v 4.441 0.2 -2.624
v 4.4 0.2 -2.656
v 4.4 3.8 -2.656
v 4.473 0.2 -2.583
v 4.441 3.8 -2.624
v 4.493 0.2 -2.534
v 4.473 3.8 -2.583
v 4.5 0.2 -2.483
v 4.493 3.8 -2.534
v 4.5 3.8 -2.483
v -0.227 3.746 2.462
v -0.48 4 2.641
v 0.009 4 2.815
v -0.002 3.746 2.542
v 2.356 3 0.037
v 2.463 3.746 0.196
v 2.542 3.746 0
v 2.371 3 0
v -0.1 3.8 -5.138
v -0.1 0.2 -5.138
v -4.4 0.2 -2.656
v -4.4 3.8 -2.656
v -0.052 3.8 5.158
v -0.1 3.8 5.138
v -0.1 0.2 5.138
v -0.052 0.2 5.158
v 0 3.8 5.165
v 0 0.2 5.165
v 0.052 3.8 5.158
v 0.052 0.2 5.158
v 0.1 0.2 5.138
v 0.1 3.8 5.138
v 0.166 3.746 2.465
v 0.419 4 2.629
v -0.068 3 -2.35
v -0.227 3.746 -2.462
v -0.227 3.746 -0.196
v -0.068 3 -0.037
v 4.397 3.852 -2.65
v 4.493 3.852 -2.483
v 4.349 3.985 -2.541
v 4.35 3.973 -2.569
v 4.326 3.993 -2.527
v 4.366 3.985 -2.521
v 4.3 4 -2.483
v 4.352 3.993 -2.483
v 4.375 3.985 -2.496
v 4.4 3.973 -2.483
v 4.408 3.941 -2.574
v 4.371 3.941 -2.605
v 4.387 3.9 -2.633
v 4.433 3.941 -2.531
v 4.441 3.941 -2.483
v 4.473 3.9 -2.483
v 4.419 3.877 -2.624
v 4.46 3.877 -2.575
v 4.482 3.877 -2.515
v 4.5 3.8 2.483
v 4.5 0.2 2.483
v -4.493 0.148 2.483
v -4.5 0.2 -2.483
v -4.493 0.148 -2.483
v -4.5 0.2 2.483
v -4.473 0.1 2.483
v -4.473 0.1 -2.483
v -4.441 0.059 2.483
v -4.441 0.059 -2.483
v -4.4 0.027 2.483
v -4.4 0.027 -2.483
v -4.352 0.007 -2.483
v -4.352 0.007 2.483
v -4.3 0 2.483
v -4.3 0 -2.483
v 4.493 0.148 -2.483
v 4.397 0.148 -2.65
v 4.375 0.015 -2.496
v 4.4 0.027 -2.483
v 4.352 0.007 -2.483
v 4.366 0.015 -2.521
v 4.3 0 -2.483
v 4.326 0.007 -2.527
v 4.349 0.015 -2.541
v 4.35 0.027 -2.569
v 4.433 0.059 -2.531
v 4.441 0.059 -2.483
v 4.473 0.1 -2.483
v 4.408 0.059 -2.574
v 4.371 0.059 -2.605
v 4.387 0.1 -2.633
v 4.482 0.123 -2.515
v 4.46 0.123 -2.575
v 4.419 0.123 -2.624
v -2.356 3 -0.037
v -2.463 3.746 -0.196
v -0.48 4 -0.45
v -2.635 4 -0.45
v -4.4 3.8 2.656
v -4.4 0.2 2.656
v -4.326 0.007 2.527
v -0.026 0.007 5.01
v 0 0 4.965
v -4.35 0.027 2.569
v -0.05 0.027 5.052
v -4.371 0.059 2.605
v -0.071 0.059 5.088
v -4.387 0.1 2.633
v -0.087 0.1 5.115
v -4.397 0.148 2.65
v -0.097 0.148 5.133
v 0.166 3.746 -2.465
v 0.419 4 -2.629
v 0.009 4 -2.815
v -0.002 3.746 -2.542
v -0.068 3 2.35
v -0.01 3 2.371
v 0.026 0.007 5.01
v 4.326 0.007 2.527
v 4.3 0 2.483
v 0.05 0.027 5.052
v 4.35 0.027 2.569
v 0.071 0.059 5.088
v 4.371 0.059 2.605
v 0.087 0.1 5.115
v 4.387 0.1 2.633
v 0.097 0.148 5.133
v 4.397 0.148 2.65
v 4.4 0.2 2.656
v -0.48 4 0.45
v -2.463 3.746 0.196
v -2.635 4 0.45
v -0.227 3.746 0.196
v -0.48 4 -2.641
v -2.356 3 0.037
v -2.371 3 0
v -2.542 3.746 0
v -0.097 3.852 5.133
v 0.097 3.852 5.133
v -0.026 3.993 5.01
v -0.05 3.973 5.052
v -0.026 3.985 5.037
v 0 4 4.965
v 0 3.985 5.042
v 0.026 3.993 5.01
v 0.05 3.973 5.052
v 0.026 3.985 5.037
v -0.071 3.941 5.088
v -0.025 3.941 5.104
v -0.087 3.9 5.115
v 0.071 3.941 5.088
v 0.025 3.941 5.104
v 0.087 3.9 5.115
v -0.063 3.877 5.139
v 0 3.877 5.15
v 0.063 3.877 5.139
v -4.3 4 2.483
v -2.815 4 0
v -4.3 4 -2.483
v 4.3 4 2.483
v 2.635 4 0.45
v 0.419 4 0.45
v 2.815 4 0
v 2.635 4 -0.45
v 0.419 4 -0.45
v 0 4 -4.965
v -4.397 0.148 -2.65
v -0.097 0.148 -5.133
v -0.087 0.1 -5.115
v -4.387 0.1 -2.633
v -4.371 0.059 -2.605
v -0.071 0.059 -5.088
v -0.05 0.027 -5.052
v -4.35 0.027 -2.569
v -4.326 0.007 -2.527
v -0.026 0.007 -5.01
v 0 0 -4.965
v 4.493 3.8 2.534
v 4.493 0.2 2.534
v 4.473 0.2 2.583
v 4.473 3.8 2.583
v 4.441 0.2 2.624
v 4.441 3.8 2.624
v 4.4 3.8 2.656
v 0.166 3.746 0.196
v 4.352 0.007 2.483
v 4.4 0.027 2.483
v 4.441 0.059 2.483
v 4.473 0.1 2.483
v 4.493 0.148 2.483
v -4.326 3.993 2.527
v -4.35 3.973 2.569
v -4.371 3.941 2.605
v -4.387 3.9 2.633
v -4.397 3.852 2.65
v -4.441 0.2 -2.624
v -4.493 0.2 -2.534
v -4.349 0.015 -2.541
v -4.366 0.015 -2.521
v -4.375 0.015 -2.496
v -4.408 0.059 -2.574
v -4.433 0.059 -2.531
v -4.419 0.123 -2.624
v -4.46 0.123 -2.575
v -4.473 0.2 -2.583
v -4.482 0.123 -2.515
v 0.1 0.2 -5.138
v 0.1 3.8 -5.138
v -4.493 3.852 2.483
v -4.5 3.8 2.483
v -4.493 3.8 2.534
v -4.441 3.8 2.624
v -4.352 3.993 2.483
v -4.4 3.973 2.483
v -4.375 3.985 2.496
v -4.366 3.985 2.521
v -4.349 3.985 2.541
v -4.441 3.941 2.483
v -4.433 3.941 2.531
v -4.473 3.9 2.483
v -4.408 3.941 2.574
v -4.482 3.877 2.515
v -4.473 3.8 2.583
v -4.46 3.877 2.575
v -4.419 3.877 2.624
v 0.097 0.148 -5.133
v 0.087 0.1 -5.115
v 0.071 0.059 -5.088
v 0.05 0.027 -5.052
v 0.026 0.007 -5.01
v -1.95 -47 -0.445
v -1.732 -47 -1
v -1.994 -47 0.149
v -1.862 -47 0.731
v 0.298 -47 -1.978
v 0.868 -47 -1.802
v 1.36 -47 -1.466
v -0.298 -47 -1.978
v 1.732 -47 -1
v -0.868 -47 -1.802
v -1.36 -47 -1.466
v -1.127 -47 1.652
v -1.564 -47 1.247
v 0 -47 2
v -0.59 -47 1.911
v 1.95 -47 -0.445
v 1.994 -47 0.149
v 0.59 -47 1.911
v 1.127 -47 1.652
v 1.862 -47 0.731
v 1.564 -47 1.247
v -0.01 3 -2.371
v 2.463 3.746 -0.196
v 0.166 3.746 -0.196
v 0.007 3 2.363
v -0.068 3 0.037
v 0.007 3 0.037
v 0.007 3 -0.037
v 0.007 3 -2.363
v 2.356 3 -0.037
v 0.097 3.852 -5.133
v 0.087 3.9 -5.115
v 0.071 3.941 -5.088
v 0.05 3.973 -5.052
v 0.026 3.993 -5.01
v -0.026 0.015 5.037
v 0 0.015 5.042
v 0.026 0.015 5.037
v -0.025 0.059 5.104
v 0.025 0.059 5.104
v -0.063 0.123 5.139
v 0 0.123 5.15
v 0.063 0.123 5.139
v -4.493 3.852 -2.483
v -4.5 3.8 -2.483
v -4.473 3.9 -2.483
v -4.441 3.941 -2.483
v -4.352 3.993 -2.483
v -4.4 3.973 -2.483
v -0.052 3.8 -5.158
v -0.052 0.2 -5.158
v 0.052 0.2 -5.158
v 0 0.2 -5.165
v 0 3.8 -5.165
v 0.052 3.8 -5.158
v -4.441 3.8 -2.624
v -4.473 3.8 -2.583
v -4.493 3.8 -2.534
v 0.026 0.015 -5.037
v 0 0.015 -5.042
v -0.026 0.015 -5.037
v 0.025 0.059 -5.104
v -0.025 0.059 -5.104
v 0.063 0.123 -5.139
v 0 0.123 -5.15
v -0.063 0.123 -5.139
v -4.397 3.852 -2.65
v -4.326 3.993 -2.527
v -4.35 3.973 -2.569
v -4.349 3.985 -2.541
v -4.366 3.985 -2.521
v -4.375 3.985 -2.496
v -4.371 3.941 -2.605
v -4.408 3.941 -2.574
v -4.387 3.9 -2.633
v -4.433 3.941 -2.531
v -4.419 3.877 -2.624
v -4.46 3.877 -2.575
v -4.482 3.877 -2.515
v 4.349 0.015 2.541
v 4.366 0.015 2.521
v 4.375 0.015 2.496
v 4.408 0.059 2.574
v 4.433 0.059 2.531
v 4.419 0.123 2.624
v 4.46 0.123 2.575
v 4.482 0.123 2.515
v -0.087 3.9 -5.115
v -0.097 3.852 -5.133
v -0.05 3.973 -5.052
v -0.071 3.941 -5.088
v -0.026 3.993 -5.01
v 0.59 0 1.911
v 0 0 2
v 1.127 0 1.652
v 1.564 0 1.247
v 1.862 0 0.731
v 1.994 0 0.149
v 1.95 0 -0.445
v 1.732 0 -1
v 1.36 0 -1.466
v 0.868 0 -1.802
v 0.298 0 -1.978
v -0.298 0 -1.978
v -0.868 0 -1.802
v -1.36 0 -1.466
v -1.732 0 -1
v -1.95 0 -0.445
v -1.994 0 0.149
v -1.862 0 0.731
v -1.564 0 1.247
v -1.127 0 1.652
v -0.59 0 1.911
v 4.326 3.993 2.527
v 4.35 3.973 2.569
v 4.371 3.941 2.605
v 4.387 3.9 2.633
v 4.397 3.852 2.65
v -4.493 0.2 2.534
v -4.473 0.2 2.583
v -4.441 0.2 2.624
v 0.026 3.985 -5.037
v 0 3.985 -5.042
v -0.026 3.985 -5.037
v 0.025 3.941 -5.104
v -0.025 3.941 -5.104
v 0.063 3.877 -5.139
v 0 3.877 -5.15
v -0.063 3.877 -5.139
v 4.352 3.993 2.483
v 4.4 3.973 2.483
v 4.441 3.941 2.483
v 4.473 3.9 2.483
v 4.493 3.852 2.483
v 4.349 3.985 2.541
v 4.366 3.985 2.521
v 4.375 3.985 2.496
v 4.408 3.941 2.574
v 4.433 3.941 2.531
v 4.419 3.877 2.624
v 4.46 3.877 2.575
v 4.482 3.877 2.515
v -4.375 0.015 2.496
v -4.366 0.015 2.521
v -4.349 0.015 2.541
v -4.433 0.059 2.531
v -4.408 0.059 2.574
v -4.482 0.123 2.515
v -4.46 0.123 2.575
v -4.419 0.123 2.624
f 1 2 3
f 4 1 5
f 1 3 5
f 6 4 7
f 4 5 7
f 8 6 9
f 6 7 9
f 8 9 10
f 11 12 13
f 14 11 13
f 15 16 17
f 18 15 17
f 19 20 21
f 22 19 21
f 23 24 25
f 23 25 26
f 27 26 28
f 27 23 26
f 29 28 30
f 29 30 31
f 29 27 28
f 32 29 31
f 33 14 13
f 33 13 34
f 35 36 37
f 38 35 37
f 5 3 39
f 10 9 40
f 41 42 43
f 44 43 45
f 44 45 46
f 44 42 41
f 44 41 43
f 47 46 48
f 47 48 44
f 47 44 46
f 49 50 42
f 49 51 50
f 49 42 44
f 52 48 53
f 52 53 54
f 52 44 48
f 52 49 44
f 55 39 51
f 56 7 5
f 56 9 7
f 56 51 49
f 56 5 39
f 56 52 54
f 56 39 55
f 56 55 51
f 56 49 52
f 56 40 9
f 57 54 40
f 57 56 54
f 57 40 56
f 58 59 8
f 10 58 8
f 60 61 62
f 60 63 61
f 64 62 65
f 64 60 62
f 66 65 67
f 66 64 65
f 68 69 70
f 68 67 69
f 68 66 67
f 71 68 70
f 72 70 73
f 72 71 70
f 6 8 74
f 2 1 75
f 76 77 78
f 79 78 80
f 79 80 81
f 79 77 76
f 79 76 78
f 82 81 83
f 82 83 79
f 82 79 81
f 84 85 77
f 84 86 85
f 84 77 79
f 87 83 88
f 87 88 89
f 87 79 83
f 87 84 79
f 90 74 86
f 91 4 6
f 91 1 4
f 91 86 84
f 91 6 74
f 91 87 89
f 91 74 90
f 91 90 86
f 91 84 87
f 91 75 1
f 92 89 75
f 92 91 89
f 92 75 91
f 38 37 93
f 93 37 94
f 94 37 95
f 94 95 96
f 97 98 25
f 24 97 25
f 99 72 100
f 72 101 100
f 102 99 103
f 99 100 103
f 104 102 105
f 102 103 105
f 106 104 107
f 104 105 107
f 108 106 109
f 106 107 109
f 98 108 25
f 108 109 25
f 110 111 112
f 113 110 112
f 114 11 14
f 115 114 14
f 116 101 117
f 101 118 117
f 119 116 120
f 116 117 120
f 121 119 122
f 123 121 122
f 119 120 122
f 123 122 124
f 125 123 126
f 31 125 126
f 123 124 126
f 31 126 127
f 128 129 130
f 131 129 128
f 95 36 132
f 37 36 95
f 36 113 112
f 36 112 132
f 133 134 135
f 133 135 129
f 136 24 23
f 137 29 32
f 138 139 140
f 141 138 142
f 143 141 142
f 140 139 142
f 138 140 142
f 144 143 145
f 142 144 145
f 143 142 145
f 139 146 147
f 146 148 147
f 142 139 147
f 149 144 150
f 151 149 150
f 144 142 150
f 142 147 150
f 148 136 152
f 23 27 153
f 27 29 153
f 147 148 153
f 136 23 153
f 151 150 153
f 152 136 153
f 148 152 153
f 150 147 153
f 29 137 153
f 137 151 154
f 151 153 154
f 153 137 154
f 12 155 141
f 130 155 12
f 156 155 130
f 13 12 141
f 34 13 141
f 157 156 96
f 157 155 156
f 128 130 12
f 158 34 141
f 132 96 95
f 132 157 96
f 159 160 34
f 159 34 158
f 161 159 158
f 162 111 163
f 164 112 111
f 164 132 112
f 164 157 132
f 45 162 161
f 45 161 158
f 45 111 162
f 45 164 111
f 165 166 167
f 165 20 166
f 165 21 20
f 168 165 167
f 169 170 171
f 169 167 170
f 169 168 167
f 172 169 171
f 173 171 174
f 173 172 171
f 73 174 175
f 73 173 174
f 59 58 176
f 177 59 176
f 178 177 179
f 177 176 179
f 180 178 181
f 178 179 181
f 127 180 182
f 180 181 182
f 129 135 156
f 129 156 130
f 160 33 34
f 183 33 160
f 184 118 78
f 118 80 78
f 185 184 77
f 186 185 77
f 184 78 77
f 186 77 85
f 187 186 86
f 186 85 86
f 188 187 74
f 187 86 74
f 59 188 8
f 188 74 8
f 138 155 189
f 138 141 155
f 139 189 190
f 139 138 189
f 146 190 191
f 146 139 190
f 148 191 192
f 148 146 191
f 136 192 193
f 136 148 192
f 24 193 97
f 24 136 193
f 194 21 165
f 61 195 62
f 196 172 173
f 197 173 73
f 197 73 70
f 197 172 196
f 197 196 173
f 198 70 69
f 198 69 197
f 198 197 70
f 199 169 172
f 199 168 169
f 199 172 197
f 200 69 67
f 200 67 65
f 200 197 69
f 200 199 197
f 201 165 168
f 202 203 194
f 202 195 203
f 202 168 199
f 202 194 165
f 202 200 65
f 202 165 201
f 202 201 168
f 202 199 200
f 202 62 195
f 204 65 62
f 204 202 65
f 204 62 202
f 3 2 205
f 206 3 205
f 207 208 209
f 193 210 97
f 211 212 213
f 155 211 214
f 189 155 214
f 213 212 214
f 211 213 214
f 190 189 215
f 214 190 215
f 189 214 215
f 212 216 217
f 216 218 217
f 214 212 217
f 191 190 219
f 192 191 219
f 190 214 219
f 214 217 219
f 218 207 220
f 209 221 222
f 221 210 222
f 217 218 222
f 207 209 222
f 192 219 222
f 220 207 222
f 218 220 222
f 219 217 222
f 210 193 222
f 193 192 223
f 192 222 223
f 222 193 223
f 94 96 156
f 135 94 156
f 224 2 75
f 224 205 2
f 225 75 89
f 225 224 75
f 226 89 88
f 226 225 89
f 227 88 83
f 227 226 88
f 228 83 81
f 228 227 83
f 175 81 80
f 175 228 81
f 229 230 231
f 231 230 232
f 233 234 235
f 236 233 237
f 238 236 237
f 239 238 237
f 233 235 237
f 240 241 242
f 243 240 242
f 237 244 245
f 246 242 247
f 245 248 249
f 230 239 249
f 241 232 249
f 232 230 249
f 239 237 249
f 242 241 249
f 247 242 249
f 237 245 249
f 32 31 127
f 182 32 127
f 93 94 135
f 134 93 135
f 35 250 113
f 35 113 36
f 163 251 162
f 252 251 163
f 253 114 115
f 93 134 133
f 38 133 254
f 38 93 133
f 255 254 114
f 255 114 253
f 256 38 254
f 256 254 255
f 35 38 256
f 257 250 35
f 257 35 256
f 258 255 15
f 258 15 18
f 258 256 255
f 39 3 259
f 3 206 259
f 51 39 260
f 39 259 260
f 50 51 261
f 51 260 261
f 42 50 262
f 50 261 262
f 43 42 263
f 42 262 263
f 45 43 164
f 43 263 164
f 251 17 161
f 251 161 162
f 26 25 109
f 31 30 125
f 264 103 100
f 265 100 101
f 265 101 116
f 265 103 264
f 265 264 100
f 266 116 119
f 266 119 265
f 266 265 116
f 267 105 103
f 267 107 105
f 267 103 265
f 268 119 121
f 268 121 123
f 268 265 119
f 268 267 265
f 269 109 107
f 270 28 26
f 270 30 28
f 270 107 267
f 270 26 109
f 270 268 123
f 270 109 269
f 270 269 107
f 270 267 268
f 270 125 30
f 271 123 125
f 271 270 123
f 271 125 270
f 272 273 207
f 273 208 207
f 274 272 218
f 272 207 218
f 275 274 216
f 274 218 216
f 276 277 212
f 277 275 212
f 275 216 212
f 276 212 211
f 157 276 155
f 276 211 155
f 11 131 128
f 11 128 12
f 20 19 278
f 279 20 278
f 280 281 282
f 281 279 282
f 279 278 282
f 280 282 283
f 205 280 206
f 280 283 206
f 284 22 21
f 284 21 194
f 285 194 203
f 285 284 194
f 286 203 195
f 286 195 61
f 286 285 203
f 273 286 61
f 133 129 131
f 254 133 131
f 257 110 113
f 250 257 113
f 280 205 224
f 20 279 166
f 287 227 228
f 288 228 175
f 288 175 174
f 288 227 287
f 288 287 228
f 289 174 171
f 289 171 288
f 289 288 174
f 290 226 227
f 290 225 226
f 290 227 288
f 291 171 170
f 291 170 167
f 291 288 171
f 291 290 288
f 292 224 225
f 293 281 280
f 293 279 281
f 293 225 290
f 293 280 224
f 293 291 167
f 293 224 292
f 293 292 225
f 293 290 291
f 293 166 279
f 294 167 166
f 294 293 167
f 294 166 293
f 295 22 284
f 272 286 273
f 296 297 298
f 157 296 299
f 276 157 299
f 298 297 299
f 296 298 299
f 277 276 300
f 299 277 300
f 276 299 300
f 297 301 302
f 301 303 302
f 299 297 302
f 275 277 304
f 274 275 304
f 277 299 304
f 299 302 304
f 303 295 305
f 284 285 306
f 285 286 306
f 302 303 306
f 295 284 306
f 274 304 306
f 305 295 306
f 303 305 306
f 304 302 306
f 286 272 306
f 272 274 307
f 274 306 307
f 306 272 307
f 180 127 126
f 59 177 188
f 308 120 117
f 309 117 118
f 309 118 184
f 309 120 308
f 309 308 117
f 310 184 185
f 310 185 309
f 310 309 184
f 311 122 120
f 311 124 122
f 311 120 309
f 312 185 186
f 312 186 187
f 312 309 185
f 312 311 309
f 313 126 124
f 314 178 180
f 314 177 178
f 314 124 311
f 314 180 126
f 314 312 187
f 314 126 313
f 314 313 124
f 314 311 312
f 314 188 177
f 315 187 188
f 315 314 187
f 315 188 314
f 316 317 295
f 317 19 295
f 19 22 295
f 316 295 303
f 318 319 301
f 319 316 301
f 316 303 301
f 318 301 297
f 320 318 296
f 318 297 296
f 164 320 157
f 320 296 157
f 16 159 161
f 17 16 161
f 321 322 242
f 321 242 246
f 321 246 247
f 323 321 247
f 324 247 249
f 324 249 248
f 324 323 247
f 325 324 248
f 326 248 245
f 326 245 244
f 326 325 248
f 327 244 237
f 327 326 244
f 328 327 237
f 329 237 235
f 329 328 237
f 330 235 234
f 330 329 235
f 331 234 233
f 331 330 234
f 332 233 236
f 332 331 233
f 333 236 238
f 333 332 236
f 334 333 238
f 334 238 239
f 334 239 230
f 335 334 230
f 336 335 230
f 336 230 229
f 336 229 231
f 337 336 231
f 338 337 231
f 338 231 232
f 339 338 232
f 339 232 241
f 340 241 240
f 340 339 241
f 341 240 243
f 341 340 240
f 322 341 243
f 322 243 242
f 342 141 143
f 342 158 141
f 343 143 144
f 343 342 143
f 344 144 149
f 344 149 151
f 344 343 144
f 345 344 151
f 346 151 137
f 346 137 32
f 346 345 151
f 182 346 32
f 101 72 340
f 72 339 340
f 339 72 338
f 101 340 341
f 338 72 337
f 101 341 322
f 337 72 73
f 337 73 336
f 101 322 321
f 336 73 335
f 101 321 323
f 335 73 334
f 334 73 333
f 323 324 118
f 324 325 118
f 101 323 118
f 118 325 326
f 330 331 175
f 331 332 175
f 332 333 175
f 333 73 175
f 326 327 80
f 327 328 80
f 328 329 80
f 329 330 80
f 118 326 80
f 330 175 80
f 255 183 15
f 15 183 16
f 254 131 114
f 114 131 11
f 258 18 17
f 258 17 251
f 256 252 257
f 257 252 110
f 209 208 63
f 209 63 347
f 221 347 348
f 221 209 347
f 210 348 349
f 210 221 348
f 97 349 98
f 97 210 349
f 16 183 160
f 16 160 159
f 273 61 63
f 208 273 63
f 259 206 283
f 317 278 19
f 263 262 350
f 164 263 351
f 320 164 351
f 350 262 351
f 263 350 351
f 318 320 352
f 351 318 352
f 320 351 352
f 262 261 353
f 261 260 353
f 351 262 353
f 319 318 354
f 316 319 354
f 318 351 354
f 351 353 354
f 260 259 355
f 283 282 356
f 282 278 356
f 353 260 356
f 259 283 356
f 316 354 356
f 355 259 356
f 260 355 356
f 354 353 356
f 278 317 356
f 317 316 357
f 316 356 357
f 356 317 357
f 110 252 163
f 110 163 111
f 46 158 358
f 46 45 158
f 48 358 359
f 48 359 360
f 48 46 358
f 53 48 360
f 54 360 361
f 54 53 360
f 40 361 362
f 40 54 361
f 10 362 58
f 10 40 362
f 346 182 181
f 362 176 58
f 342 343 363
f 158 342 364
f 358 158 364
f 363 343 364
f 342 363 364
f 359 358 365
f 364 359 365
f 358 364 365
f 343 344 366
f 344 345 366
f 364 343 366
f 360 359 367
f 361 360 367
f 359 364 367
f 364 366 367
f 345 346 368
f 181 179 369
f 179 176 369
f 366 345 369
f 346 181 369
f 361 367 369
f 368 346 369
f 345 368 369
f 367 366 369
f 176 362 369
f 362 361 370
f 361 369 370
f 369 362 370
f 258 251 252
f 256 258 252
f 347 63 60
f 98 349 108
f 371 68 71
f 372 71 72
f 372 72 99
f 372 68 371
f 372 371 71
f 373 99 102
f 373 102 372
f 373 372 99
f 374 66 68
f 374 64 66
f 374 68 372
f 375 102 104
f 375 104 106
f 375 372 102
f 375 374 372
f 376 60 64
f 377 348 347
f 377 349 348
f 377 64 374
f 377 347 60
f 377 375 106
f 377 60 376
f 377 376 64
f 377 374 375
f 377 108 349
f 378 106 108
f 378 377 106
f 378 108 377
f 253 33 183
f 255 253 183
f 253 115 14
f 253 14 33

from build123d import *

# Parameters (mm, degrees)
SKETCH1_R           = 2
BOSS_EXTRUDE1_DEPTH = 47
BOSS_EXTRUDE2_DEPTH = 4
FILLET1_R           = 0.2
CUT_EXTRUDE2_DEPTH  = 1
CUT_EXTRUDE2_DRAFT  = -12
CHAMFER1_SIZE       = 0.2
CHAMFER1_SIZE2      = 0.259660706


with BuildPart() as part:
    # Sketch1 → Boss-Extrude1 (new body)
    with BuildSketch(Plane(origin=(0, 0, 0), x_dir=(1, 0, 0), z_dir=(0, 1, 0))):
        Circle(SKETCH1_R)
    extrude(amount=-BOSS_EXTRUDE1_DEPTH)

    # Sketch2 → Boss-Extrude2 (add)
    with BuildSketch(Plane(origin=(0, 0, 0), x_dir=(1, 0, 0), z_dir=(0, 1, 0))):
        Polygon((0, 5.196152423), (-4.5, 2.598076211), (-4.5, -2.598076211), (0, -5.196152423), (4.5, -2.598076211), (4.5, 2.598076211), align=None)
    extrude(amount=BOSS_EXTRUDE2_DEPTH)

    # Fillet1
    fillet1_edges = [part.edges().sort_by_distance(p)[0] for p in [
        (2.25, 0, -3.897114317),
        (-2.25, 0, -3.897114317),
        (-4.5, 0, 0),
        (-2.25, 0, 3.897114317),
        (2.25, 0, 3.897114317),
        (4.5, 0, 0),
        (2.25, 4, -3.897114317),
        (-2.25, 4, -3.897114317),
        (-4.5, 4, 0),
        (-2.25, 4, 3.897114317),
        (2.25, 4, 3.897114317),
        (4.5, 2, -2.598076211),
        (4.5, 2, 2.598076211),
        (0, 2, 5.196152423),
        (-4.5, 2, 2.598076211),
        (-4.5, 2, -2.598076211),
        (0, 2, -5.196152423),
        (4.5, 4, 0),
    ]]
    fillet(fillet1_edges, radius=FILLET1_R)


with BuildPart() as cut_extrude2_tool:
    # Sketch3 → Cut-Extrude2 (with draft: the straight prism first)
    with BuildSketch(Plane(origin=(0, 4, 0), x_dir=(1, 0, 0), z_dir=(0, 1, 0))):
        Polygon((0, 2.6), (-0.280523914, 2.5), (-0.280523914, 0.25), (-2.5, 0.25), (-2.6, 0), (-2.5, -0.25), (-0.280523914, -0.25), (-0.280523914, -2.5), (0, -2.6), (0.219476086, -2.5), (0.219476086, -0.25), (2.5, -0.25), (2.6, 0), (2.5, 0.25), (0.219476086, 0.25), (0.219476086, 2.5), align=None)
    extrude(amount=-CUT_EXTRUDE2_DEPTH)
    # Cut-Extrude2: the draft: its side faces are tilted about the plane it starts from
    cut_extrude2_sides = [cut_extrude2_tool.faces().sort_by_distance(p)[0] for p in [
        (-0.140261957, 3.5, -2.55),
        (-0.280523914, 3.5, -1.375),
        (-1.390261957, 3.5, -0.25),
        (-2.55, 3.5, -0.125),
        (-2.55, 3.5, 0.125),
        (-1.390261957, 3.5, 0.25),
        (-0.280523914, 3.5, 1.375),
        (-0.140261957, 3.5, 2.55),
        (0.109738043, 3.5, 2.55),
        (0.219476086, 3.5, 1.375),
        (1.359738043, 3.5, 0.25),
        (2.55, 3.5, 0.125),
        (2.55, 3.5, -0.125),
        (1.359738043, 3.5, -0.25),
        (0.219476086, 3.5, -1.375),
        (0.109738043, 3.5, -2.55),
    ]]
    draft(cut_extrude2_sides, Plane(origin=(0, 4, 0), x_dir=(1, 0, 0), z_dir=(0, 1, 0)), CUT_EXTRUDE2_DRAFT)


with BuildPart() as part_1:
    add(part.part)

    # Cut-Extrude2: cut by cut_extrude2_tool
    add(cut_extrude2_tool.part, mode=Mode.SUBTRACT)

    # Chamfer1
    chamfer1_edges = [part_1.edges().sort_by_distance(p)[0] for p in [
        (0.109738043, 4, 2.55),
        (-0.140261957, 4, 2.55),
        (-0.280523914, 4, 1.375),
        (0.219476086, 4, 1.375),
        (1.359738043, 4, 0.25),
        (2.55, 4, 0.125),
        (2.55, 4, -0.125),
        (1.359738043, 4, -0.25),
        (0.219476086, 4, -1.375),
        (0.109738043, 4, -2.55),
        (-0.140261957, 4, -2.55),
        (-0.280523914, 4, -1.375),
        (-1.390261957, 4, 0.25),
        (-2.55, 4, 0.125),
        (-2.55, 4, -0.125),
        (-1.390261957, 4, -0.25),
    ]]
    chamfer1_side = [part_1.faces().sort_by_distance(p)[0] for p in [
        (2.084316415, 4, -3.61014193),
    ]]
    chamfer(chamfer1_edges, length=CHAMFER1_SIZE, length2=CHAMFER1_SIZE2, reference=chamfer1_side[0])


solid = part_1.part
